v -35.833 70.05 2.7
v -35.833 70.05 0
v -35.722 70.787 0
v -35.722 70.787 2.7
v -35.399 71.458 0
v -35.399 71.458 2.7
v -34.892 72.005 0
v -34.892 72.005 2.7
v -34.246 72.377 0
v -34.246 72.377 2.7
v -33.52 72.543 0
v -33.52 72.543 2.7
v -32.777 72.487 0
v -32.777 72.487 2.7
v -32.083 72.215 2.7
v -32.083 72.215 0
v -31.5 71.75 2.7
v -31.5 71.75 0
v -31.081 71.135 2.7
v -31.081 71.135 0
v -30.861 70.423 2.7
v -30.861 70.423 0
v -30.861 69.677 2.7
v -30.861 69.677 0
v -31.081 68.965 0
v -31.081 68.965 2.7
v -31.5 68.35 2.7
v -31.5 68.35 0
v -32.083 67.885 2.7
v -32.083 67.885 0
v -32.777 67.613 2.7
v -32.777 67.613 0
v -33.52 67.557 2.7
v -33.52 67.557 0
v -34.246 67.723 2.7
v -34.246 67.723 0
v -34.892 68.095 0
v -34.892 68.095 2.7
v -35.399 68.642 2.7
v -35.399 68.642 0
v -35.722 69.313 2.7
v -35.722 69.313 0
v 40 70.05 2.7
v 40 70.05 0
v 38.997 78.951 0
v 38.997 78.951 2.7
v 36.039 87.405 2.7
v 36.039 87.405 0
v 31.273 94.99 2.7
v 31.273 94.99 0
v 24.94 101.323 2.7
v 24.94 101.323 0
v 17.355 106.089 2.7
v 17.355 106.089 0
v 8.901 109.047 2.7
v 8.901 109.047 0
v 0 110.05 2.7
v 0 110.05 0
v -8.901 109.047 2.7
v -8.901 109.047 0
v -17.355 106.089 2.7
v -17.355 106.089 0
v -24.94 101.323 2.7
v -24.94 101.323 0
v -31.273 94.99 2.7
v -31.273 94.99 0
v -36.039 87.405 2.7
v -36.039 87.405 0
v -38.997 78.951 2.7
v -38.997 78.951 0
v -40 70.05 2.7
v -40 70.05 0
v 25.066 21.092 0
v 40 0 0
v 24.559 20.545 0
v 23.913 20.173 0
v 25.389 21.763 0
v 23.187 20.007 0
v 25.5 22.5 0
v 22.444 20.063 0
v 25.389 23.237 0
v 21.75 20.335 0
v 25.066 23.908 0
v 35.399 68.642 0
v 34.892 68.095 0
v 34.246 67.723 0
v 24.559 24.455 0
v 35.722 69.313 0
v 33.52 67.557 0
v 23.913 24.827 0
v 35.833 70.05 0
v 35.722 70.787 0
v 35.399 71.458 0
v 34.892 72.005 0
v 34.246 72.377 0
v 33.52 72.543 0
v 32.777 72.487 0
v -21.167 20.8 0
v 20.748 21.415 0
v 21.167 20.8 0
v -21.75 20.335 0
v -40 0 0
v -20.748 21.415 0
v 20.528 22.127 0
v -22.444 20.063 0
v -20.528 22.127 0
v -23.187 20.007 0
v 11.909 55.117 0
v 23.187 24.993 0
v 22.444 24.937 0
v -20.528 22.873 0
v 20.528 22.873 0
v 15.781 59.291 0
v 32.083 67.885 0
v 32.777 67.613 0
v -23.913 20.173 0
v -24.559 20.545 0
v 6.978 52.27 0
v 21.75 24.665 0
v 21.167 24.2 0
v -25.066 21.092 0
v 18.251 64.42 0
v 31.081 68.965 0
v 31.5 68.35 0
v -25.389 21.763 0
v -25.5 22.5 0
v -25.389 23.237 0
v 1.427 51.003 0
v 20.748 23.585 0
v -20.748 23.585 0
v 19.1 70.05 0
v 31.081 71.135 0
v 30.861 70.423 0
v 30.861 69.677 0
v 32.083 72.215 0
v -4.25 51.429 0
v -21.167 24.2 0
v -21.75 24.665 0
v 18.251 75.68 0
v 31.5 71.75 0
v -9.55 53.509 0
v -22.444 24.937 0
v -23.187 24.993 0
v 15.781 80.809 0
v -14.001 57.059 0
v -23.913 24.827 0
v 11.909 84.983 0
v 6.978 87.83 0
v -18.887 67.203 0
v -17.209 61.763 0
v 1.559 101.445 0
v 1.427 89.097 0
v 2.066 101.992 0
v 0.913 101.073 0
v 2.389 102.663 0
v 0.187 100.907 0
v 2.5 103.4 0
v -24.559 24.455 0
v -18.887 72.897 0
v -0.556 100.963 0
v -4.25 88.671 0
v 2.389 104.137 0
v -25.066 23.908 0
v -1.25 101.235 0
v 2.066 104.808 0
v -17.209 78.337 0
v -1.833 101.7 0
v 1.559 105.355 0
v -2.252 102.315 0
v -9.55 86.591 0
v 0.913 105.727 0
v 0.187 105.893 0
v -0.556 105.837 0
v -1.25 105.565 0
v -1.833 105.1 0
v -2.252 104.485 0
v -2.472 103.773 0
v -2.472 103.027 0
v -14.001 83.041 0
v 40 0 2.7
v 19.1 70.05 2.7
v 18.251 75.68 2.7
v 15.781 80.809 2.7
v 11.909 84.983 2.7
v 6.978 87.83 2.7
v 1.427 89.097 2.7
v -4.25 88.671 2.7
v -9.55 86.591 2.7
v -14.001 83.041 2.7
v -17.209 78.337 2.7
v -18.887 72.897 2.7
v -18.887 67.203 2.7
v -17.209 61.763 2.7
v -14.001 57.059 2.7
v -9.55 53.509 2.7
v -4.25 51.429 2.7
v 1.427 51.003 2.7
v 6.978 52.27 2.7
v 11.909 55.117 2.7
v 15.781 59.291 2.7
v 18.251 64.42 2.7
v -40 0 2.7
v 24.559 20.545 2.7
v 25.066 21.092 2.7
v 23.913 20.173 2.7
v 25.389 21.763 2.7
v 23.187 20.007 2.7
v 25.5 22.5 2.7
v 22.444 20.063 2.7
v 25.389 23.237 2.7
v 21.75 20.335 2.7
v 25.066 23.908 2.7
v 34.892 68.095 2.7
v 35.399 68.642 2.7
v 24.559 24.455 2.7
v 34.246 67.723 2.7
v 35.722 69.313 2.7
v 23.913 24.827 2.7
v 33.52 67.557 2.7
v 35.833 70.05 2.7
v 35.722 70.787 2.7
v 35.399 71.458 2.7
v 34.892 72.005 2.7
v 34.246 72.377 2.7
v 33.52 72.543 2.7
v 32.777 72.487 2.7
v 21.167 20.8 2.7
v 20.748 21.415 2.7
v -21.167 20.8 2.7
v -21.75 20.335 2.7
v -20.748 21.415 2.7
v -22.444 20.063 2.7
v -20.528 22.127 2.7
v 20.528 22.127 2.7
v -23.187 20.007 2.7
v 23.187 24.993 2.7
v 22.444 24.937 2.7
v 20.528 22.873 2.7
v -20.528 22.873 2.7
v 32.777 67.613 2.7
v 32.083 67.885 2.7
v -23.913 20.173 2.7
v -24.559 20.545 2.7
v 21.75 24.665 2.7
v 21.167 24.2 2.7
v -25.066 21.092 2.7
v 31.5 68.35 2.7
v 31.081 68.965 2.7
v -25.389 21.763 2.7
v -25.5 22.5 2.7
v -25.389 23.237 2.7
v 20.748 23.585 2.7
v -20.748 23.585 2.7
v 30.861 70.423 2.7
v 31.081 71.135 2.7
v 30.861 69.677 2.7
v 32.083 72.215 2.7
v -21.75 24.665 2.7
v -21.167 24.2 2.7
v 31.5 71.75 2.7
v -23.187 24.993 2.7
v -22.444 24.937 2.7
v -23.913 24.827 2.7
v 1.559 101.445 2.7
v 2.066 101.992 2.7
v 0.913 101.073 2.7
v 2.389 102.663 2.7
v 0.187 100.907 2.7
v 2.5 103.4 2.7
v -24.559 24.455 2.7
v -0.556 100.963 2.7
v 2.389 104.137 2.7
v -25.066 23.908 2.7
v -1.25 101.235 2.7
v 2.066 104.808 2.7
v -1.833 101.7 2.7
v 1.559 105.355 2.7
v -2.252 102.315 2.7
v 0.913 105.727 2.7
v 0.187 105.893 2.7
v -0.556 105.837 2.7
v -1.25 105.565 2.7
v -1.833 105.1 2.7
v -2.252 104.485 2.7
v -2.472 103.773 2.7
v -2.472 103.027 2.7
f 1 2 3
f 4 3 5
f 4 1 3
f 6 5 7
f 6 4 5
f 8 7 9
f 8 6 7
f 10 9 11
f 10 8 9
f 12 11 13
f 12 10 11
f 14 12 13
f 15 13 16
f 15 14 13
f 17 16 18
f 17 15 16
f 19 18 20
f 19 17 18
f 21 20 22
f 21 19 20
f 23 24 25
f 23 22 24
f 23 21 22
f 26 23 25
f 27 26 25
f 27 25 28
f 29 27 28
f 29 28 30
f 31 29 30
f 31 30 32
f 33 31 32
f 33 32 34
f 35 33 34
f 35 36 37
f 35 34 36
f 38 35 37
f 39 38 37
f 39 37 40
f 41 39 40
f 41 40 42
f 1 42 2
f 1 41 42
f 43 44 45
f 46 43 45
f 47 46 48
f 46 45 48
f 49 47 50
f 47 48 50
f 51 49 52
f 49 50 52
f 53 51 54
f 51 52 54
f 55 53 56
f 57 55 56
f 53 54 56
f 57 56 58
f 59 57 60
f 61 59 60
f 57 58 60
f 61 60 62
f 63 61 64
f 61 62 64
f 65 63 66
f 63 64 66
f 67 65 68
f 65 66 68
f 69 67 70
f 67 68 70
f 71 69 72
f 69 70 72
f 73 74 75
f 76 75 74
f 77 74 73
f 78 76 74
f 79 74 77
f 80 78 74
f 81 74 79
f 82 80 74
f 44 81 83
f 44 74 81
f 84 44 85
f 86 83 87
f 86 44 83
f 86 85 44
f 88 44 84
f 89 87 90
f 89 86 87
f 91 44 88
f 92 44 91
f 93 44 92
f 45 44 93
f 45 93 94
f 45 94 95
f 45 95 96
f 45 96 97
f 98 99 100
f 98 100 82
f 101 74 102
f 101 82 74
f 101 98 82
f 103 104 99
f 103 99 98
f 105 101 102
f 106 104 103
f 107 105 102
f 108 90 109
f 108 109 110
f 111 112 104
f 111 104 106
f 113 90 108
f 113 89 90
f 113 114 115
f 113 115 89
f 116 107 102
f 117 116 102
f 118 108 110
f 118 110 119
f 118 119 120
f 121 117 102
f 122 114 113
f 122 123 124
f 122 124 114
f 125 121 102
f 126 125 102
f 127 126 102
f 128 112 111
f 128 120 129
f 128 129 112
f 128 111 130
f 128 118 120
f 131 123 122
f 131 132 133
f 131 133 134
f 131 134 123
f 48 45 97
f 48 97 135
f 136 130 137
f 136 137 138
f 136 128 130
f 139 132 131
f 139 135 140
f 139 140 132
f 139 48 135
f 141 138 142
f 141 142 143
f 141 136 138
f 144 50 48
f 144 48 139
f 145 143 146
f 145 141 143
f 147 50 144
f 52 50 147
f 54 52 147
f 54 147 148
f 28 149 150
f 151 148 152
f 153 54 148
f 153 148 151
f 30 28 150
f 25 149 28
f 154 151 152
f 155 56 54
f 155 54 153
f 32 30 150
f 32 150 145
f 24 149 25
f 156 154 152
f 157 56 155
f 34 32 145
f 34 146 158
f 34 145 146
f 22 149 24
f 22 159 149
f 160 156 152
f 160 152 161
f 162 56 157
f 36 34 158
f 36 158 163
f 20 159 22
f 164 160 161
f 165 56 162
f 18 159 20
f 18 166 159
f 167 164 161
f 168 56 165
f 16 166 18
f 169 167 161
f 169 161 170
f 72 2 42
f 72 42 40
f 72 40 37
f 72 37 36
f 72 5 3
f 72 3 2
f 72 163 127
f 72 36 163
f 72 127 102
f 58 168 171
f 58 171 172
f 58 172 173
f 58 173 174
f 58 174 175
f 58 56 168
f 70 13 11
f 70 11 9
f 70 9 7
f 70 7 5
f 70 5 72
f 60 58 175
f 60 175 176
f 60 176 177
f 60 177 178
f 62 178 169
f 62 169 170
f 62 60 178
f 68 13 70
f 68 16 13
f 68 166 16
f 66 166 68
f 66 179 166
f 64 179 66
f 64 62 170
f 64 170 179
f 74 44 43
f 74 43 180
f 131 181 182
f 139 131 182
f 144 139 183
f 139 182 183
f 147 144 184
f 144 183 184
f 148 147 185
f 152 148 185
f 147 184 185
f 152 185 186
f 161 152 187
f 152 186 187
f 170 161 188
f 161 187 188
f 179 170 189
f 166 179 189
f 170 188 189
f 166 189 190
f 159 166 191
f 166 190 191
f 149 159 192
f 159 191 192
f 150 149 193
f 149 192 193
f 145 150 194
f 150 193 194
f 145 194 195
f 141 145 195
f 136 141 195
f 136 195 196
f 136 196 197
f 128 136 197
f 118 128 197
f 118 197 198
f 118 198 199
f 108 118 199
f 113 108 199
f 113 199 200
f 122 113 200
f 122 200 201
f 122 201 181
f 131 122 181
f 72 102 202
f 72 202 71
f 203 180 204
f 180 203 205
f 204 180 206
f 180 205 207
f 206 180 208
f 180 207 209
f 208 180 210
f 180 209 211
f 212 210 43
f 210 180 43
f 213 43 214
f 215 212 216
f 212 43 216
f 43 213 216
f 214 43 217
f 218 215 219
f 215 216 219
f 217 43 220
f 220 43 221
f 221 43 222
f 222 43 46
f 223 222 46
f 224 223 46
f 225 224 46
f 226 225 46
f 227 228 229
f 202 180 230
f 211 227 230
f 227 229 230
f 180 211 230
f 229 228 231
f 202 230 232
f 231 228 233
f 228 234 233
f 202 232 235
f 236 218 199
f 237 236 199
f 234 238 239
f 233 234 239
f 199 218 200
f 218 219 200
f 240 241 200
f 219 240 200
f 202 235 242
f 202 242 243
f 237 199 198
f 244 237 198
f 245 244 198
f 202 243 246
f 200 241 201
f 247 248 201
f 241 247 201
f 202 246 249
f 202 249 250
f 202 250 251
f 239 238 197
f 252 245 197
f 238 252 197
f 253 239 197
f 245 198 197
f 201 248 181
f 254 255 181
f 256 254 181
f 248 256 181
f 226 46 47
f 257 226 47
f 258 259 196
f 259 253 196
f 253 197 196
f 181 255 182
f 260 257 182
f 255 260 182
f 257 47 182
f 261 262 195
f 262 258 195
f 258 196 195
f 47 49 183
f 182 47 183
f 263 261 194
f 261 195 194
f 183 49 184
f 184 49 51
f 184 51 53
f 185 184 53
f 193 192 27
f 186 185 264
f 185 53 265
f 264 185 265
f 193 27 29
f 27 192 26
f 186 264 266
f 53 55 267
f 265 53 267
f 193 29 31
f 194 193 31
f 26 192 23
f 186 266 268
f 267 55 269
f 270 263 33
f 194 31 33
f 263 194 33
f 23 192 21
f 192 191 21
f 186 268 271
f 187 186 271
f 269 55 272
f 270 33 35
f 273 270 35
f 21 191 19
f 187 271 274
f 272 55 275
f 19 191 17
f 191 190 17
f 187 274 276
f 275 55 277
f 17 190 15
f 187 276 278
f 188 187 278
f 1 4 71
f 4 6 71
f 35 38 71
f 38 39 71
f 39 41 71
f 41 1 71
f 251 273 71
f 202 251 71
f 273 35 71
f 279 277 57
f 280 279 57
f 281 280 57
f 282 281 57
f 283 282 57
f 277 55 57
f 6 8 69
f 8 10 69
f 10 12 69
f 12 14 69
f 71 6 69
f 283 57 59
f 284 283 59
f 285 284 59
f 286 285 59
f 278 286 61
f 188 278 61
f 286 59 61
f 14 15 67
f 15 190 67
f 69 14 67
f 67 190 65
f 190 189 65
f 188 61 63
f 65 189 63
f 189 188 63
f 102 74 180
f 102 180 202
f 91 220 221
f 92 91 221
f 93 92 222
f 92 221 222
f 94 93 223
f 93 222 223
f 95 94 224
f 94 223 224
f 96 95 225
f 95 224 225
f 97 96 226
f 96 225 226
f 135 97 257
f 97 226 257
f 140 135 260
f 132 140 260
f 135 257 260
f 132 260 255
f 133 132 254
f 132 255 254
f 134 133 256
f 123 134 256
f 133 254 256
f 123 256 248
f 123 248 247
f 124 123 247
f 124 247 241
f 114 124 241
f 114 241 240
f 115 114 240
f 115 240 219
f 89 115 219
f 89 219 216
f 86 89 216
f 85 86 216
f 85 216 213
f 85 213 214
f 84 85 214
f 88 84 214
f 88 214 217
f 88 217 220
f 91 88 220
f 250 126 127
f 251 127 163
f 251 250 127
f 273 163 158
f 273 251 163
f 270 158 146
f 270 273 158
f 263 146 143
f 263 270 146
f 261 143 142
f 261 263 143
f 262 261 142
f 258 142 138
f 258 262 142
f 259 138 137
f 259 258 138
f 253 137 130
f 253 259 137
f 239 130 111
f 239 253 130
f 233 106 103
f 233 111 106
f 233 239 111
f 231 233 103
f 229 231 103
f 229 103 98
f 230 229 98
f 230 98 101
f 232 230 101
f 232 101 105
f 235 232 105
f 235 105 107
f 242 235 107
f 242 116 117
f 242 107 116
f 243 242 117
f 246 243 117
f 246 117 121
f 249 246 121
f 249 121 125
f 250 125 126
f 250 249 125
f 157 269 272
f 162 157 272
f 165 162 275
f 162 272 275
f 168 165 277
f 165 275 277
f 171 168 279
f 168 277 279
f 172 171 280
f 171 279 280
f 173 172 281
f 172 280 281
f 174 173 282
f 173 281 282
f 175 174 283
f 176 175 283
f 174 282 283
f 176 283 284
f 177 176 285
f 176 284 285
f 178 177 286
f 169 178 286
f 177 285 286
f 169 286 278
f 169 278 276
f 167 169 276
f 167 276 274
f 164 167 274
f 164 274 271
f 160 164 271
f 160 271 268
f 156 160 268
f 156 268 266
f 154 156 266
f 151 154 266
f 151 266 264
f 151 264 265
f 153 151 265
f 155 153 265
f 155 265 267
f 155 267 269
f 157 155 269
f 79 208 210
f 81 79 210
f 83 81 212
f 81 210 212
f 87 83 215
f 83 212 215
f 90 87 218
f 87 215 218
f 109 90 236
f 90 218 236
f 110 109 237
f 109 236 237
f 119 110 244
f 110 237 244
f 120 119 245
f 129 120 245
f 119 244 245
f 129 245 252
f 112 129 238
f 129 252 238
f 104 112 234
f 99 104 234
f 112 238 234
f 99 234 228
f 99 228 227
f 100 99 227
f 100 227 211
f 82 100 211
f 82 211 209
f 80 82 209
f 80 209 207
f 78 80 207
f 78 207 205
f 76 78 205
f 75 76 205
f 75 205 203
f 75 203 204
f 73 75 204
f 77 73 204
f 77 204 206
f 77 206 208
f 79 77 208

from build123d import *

# Parameters (mm, degrees)
PAD_DEPTH       = 2.7
SKETCH001_R     = 2.5
POCKET_DEPTH    = 5
SKETCH002_R     = 2.5
POCKET001_DEPTH = 5
SKETCH003_R     = 19.1
POCKET002_DEPTH = 5


with BuildPart() as part:
    # Sketch → Pad (new body)
    with BuildSketch(Plane.XY):
        with BuildLine():
            Line((40, 70.05), (40, 0))
            Line((40, 0), (-40, 0))
            Line((-40, 0), (-40, 70.05))
            ThreePointArc((40, 70.05), (0, 110.05), (-40, 70.05))
        make_face()
    extrude(amount=PAD_DEPTH)

    # Sketch001 → Pocket (cut)
    with BuildSketch(Plane.XY.offset(2.7)):
        with Locations((33.333, 70.05)):
            Circle(SKETCH001_R)
        with Locations((23, 22.5)):
            Circle(SKETCH001_R)
    pocket = extrude(amount=-POCKET_DEPTH, mode=Mode.SUBTRACT)

    # Mirrored: Pocket across Sketch001 V_Axis
    add(pocket.mirror(Plane(origin=(0, 0, 2.7), x_dir=(0, 0, 1), z_dir=(1, 0, 0))), mode=Mode.SUBTRACT)

    # Sketch002 → Pocket001 (cut)
    with BuildSketch(Plane.XY.offset(2.7)):
        with Locations((0, 103.4)):
            Circle(SKETCH002_R)
    extrude(amount=-POCKET001_DEPTH, mode=Mode.SUBTRACT)

    # Sketch003 → Pocket002 (cut)
    with BuildSketch(Plane.XY.offset(2.7)):
        with Locations((0, 70.05)):
            Circle(SKETCH003_R)
    extrude(amount=-POCKET002_DEPTH, mode=Mode.SUBTRACT)


solid = part.part
